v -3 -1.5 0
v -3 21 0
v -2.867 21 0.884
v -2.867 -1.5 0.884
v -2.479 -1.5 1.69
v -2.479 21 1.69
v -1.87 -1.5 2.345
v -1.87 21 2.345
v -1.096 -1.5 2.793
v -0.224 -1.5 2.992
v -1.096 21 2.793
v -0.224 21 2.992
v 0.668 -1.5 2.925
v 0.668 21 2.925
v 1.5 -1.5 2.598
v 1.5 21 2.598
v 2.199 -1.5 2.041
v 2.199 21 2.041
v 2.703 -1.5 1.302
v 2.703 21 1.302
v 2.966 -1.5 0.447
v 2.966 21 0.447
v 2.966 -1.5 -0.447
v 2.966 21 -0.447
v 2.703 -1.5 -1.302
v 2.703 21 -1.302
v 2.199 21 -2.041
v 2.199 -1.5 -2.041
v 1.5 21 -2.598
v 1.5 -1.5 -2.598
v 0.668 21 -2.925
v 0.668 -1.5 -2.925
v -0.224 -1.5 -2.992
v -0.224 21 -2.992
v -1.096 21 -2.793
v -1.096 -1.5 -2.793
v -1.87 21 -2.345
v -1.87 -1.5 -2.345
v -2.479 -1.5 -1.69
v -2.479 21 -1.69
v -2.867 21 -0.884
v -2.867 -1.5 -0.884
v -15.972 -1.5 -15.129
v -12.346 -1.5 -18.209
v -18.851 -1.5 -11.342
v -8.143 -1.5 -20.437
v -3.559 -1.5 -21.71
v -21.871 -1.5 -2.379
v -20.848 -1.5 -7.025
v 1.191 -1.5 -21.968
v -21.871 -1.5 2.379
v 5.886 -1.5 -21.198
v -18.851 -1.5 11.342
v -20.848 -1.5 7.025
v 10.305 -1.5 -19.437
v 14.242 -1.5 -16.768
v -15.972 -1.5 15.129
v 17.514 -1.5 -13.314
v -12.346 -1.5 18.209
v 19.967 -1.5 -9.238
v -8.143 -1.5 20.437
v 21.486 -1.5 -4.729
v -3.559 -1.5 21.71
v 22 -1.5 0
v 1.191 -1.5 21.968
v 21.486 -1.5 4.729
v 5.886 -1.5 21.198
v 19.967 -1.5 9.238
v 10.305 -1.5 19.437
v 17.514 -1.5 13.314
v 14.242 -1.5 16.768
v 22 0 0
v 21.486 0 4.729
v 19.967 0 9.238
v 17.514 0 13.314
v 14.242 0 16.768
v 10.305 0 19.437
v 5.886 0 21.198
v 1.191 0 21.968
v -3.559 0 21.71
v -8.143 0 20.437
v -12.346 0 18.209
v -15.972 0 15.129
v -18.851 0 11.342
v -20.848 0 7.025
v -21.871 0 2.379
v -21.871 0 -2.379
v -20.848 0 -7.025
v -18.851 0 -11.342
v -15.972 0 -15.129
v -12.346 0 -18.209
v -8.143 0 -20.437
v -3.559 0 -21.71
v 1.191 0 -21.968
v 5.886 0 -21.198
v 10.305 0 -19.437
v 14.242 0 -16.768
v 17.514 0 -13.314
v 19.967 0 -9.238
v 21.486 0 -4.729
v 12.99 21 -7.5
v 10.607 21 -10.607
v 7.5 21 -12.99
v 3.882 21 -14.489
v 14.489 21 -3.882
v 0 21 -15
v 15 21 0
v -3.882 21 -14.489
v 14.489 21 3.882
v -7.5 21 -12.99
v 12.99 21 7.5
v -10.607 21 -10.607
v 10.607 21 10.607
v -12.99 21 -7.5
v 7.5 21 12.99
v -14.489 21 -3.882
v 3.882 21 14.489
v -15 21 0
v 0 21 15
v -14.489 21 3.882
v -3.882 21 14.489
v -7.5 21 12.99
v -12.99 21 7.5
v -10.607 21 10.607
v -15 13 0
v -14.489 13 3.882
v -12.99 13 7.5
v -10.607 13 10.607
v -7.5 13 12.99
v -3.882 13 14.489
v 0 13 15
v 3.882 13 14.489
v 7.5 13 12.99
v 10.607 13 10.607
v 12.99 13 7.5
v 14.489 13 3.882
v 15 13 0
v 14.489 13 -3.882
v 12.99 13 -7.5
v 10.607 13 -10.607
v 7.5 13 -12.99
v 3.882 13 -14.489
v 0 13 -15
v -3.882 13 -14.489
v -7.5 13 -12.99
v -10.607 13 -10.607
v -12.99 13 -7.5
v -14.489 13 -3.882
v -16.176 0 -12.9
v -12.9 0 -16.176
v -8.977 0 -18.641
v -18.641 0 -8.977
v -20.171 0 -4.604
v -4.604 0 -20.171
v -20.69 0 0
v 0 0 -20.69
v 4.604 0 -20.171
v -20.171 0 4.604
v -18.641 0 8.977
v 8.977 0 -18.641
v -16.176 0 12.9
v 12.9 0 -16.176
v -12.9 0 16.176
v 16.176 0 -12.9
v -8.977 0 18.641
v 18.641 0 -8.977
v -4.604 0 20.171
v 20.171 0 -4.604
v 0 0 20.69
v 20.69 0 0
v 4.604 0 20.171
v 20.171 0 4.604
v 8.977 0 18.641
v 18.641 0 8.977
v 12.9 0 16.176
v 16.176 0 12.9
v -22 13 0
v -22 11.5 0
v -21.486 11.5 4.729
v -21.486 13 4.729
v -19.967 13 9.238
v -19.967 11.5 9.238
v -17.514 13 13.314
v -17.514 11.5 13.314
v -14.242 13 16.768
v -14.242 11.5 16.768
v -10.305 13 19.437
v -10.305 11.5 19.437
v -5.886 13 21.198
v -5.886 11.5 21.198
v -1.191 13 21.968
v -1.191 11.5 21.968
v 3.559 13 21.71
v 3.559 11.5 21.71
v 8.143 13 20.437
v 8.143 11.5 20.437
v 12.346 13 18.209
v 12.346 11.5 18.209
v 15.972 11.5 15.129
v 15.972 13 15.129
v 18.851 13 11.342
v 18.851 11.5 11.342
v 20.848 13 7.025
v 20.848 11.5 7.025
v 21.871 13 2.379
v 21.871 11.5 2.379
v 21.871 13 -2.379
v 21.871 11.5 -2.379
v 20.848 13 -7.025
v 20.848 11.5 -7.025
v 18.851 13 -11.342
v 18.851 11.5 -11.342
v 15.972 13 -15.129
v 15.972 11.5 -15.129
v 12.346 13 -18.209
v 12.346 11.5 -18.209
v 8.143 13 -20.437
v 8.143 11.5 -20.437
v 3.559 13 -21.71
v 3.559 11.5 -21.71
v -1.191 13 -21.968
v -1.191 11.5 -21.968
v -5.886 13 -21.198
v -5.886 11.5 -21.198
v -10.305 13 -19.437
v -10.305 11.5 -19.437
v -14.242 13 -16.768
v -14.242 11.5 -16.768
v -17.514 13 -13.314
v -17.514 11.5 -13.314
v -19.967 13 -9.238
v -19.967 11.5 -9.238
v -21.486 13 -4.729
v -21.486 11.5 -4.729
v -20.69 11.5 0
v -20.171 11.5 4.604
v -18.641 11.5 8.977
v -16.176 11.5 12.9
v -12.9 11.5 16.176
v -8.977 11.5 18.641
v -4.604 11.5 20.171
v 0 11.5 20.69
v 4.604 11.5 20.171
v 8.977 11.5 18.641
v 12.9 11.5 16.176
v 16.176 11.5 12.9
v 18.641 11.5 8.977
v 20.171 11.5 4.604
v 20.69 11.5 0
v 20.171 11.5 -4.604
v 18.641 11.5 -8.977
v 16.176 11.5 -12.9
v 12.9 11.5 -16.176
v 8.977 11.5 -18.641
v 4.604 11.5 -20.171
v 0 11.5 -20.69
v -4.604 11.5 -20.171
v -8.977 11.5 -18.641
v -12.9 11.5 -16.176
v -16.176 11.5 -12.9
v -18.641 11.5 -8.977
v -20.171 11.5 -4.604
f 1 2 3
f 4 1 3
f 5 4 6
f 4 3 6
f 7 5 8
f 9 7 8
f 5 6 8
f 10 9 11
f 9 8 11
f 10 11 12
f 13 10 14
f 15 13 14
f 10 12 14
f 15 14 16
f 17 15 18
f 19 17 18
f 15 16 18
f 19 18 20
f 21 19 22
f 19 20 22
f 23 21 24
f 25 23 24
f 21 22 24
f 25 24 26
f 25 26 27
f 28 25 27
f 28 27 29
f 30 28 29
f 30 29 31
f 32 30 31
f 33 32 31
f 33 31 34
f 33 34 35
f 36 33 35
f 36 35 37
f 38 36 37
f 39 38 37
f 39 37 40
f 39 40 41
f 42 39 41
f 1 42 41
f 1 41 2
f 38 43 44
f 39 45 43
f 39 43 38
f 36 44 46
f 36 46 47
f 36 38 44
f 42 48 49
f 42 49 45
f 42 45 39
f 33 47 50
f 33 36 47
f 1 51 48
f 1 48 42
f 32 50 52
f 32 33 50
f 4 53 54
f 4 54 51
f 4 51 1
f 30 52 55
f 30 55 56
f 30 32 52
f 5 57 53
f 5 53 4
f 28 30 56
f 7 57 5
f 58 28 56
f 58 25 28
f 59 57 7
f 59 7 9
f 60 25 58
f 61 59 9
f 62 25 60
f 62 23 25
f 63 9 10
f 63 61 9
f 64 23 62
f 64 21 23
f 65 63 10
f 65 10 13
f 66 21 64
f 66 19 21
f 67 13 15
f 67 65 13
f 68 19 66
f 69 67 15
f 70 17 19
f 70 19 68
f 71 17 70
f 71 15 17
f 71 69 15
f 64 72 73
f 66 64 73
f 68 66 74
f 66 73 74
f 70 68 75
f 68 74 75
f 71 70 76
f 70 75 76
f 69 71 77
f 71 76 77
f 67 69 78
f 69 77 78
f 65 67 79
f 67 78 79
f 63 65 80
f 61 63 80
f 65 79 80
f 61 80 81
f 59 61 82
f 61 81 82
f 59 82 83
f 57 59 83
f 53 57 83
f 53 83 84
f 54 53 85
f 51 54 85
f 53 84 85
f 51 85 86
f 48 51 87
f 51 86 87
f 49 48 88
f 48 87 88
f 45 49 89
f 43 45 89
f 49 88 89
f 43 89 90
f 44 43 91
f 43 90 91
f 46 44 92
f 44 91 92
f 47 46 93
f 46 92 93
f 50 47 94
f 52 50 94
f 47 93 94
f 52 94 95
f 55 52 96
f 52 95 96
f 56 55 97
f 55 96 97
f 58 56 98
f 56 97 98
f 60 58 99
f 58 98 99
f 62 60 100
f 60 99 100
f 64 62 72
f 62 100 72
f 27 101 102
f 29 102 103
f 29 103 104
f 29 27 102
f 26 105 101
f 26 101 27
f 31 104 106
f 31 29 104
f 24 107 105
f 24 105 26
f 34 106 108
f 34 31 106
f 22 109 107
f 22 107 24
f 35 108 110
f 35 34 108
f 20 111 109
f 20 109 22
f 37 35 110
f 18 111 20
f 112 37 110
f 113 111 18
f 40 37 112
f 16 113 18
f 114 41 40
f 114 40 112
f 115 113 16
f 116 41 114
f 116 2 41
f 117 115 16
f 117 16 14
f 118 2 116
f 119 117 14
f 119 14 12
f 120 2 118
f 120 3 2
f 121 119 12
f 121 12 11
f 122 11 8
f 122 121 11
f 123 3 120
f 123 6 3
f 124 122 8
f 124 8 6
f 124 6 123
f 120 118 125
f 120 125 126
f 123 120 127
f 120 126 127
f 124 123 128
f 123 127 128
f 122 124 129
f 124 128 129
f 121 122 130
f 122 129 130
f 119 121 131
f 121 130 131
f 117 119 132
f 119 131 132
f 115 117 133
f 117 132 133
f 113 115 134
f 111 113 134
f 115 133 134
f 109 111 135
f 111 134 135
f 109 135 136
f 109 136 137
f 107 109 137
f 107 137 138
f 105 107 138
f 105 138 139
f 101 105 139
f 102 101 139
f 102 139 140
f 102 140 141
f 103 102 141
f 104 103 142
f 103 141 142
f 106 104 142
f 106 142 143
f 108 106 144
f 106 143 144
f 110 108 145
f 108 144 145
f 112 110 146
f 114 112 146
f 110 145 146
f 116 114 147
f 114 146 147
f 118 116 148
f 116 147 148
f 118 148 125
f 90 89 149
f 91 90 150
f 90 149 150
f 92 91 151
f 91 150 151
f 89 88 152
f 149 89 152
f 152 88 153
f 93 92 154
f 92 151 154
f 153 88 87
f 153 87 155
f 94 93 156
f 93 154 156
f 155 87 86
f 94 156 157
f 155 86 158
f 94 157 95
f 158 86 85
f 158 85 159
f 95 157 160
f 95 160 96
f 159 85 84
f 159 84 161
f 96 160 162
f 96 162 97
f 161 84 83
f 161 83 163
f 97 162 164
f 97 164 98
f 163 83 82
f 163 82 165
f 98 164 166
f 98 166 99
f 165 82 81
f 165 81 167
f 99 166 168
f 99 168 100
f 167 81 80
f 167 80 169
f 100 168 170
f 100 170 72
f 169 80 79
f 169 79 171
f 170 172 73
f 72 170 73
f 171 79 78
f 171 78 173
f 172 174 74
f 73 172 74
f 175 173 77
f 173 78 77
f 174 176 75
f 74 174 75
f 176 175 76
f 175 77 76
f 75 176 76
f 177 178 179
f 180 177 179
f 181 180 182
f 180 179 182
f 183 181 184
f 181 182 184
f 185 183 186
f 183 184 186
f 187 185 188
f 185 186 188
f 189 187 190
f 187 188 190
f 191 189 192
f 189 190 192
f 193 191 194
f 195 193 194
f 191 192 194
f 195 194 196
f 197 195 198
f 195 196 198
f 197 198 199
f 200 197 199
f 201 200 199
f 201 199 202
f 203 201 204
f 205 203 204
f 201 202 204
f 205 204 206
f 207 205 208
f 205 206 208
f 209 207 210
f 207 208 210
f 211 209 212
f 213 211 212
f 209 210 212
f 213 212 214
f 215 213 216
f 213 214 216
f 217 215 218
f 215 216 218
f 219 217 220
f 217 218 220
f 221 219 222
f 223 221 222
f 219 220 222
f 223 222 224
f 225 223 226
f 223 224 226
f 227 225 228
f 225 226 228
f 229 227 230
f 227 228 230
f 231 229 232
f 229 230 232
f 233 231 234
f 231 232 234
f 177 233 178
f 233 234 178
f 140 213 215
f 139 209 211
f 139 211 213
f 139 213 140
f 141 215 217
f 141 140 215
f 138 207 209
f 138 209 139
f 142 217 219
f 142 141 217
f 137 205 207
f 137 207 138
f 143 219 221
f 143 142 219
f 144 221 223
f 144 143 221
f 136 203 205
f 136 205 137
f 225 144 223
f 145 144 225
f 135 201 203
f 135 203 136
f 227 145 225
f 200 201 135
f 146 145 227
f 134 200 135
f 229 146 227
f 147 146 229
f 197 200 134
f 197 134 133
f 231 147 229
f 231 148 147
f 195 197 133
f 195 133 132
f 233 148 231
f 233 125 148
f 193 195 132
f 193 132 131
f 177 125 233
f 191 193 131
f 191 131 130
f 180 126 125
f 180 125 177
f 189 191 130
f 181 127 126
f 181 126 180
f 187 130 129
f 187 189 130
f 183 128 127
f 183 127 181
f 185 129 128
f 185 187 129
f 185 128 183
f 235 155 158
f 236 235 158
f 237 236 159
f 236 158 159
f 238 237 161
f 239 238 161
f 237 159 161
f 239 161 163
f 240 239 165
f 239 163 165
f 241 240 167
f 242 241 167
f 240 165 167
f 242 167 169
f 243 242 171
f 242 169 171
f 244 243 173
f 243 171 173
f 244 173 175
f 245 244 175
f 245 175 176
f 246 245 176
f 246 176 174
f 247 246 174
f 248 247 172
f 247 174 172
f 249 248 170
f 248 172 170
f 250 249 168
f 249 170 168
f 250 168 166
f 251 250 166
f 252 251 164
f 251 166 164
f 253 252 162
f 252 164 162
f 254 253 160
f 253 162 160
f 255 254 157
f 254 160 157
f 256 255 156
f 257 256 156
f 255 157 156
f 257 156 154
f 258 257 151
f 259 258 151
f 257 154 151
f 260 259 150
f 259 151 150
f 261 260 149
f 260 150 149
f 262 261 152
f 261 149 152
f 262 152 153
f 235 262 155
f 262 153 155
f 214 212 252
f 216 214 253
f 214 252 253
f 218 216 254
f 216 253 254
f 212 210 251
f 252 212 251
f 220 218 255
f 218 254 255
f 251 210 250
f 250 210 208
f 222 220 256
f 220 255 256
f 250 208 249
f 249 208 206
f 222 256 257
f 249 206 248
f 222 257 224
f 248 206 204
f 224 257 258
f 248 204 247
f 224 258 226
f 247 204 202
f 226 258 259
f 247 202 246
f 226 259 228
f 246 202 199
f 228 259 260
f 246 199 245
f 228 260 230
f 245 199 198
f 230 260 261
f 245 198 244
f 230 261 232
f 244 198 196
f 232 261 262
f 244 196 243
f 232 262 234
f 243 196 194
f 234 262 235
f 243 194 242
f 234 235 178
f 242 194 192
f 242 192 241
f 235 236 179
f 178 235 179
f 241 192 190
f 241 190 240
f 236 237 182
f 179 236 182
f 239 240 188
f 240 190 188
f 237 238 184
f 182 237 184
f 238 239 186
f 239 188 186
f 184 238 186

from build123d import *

# Parameters (mm, degrees)
F0_R     = 22
F1_DEPTH = 1.5
F2_R     = 20.69
F3_DEPTH = 11.5
F4_R     = 22
F5_DEPTH = 1.5
F6_R     = 15
F7_DEPTH = 8
F8_R     = 3
F9_DEPTH = 22.501


with BuildPart() as f1:
    # F0 (on Front) → F1 (new body)
    with BuildSketch(Plane.XZ):
        Circle(F0_R)
    extrude(amount=F1_DEPTH)

    # F2 (on face) → F3 (join)
    with BuildSketch(Plane(origin=(0, 0, 0), x_dir=(-1, 0, 0), z_dir=(0, 1, 0))):
        Circle(F2_R)
    extrude(amount=F3_DEPTH)

    # F4 (on face) → F5 (join)
    with BuildSketch(Plane(origin=(0, 11.5, 0), x_dir=(-1, 0, 0), z_dir=(0, 1, 0))):
        Circle(F4_R)
    extrude(amount=F5_DEPTH)

    # F6 (on face) → F7 (join)
    with BuildSketch(Plane(origin=(0, 13, 0), x_dir=(-1, 0, 0), z_dir=(0, 1, 0))):
        Circle(F6_R)
    extrude(amount=F7_DEPTH)

    # F8 (on face) → F9 (cut, through all)
    with BuildSketch(Plane(origin=(0, 21, 0), x_dir=(-1, 0, 0), z_dir=(0, 1, 0))):
        Circle(F8_R)
    extrude(amount=-F9_DEPTH, mode=Mode.SUBTRACT)


solid = f1.part
